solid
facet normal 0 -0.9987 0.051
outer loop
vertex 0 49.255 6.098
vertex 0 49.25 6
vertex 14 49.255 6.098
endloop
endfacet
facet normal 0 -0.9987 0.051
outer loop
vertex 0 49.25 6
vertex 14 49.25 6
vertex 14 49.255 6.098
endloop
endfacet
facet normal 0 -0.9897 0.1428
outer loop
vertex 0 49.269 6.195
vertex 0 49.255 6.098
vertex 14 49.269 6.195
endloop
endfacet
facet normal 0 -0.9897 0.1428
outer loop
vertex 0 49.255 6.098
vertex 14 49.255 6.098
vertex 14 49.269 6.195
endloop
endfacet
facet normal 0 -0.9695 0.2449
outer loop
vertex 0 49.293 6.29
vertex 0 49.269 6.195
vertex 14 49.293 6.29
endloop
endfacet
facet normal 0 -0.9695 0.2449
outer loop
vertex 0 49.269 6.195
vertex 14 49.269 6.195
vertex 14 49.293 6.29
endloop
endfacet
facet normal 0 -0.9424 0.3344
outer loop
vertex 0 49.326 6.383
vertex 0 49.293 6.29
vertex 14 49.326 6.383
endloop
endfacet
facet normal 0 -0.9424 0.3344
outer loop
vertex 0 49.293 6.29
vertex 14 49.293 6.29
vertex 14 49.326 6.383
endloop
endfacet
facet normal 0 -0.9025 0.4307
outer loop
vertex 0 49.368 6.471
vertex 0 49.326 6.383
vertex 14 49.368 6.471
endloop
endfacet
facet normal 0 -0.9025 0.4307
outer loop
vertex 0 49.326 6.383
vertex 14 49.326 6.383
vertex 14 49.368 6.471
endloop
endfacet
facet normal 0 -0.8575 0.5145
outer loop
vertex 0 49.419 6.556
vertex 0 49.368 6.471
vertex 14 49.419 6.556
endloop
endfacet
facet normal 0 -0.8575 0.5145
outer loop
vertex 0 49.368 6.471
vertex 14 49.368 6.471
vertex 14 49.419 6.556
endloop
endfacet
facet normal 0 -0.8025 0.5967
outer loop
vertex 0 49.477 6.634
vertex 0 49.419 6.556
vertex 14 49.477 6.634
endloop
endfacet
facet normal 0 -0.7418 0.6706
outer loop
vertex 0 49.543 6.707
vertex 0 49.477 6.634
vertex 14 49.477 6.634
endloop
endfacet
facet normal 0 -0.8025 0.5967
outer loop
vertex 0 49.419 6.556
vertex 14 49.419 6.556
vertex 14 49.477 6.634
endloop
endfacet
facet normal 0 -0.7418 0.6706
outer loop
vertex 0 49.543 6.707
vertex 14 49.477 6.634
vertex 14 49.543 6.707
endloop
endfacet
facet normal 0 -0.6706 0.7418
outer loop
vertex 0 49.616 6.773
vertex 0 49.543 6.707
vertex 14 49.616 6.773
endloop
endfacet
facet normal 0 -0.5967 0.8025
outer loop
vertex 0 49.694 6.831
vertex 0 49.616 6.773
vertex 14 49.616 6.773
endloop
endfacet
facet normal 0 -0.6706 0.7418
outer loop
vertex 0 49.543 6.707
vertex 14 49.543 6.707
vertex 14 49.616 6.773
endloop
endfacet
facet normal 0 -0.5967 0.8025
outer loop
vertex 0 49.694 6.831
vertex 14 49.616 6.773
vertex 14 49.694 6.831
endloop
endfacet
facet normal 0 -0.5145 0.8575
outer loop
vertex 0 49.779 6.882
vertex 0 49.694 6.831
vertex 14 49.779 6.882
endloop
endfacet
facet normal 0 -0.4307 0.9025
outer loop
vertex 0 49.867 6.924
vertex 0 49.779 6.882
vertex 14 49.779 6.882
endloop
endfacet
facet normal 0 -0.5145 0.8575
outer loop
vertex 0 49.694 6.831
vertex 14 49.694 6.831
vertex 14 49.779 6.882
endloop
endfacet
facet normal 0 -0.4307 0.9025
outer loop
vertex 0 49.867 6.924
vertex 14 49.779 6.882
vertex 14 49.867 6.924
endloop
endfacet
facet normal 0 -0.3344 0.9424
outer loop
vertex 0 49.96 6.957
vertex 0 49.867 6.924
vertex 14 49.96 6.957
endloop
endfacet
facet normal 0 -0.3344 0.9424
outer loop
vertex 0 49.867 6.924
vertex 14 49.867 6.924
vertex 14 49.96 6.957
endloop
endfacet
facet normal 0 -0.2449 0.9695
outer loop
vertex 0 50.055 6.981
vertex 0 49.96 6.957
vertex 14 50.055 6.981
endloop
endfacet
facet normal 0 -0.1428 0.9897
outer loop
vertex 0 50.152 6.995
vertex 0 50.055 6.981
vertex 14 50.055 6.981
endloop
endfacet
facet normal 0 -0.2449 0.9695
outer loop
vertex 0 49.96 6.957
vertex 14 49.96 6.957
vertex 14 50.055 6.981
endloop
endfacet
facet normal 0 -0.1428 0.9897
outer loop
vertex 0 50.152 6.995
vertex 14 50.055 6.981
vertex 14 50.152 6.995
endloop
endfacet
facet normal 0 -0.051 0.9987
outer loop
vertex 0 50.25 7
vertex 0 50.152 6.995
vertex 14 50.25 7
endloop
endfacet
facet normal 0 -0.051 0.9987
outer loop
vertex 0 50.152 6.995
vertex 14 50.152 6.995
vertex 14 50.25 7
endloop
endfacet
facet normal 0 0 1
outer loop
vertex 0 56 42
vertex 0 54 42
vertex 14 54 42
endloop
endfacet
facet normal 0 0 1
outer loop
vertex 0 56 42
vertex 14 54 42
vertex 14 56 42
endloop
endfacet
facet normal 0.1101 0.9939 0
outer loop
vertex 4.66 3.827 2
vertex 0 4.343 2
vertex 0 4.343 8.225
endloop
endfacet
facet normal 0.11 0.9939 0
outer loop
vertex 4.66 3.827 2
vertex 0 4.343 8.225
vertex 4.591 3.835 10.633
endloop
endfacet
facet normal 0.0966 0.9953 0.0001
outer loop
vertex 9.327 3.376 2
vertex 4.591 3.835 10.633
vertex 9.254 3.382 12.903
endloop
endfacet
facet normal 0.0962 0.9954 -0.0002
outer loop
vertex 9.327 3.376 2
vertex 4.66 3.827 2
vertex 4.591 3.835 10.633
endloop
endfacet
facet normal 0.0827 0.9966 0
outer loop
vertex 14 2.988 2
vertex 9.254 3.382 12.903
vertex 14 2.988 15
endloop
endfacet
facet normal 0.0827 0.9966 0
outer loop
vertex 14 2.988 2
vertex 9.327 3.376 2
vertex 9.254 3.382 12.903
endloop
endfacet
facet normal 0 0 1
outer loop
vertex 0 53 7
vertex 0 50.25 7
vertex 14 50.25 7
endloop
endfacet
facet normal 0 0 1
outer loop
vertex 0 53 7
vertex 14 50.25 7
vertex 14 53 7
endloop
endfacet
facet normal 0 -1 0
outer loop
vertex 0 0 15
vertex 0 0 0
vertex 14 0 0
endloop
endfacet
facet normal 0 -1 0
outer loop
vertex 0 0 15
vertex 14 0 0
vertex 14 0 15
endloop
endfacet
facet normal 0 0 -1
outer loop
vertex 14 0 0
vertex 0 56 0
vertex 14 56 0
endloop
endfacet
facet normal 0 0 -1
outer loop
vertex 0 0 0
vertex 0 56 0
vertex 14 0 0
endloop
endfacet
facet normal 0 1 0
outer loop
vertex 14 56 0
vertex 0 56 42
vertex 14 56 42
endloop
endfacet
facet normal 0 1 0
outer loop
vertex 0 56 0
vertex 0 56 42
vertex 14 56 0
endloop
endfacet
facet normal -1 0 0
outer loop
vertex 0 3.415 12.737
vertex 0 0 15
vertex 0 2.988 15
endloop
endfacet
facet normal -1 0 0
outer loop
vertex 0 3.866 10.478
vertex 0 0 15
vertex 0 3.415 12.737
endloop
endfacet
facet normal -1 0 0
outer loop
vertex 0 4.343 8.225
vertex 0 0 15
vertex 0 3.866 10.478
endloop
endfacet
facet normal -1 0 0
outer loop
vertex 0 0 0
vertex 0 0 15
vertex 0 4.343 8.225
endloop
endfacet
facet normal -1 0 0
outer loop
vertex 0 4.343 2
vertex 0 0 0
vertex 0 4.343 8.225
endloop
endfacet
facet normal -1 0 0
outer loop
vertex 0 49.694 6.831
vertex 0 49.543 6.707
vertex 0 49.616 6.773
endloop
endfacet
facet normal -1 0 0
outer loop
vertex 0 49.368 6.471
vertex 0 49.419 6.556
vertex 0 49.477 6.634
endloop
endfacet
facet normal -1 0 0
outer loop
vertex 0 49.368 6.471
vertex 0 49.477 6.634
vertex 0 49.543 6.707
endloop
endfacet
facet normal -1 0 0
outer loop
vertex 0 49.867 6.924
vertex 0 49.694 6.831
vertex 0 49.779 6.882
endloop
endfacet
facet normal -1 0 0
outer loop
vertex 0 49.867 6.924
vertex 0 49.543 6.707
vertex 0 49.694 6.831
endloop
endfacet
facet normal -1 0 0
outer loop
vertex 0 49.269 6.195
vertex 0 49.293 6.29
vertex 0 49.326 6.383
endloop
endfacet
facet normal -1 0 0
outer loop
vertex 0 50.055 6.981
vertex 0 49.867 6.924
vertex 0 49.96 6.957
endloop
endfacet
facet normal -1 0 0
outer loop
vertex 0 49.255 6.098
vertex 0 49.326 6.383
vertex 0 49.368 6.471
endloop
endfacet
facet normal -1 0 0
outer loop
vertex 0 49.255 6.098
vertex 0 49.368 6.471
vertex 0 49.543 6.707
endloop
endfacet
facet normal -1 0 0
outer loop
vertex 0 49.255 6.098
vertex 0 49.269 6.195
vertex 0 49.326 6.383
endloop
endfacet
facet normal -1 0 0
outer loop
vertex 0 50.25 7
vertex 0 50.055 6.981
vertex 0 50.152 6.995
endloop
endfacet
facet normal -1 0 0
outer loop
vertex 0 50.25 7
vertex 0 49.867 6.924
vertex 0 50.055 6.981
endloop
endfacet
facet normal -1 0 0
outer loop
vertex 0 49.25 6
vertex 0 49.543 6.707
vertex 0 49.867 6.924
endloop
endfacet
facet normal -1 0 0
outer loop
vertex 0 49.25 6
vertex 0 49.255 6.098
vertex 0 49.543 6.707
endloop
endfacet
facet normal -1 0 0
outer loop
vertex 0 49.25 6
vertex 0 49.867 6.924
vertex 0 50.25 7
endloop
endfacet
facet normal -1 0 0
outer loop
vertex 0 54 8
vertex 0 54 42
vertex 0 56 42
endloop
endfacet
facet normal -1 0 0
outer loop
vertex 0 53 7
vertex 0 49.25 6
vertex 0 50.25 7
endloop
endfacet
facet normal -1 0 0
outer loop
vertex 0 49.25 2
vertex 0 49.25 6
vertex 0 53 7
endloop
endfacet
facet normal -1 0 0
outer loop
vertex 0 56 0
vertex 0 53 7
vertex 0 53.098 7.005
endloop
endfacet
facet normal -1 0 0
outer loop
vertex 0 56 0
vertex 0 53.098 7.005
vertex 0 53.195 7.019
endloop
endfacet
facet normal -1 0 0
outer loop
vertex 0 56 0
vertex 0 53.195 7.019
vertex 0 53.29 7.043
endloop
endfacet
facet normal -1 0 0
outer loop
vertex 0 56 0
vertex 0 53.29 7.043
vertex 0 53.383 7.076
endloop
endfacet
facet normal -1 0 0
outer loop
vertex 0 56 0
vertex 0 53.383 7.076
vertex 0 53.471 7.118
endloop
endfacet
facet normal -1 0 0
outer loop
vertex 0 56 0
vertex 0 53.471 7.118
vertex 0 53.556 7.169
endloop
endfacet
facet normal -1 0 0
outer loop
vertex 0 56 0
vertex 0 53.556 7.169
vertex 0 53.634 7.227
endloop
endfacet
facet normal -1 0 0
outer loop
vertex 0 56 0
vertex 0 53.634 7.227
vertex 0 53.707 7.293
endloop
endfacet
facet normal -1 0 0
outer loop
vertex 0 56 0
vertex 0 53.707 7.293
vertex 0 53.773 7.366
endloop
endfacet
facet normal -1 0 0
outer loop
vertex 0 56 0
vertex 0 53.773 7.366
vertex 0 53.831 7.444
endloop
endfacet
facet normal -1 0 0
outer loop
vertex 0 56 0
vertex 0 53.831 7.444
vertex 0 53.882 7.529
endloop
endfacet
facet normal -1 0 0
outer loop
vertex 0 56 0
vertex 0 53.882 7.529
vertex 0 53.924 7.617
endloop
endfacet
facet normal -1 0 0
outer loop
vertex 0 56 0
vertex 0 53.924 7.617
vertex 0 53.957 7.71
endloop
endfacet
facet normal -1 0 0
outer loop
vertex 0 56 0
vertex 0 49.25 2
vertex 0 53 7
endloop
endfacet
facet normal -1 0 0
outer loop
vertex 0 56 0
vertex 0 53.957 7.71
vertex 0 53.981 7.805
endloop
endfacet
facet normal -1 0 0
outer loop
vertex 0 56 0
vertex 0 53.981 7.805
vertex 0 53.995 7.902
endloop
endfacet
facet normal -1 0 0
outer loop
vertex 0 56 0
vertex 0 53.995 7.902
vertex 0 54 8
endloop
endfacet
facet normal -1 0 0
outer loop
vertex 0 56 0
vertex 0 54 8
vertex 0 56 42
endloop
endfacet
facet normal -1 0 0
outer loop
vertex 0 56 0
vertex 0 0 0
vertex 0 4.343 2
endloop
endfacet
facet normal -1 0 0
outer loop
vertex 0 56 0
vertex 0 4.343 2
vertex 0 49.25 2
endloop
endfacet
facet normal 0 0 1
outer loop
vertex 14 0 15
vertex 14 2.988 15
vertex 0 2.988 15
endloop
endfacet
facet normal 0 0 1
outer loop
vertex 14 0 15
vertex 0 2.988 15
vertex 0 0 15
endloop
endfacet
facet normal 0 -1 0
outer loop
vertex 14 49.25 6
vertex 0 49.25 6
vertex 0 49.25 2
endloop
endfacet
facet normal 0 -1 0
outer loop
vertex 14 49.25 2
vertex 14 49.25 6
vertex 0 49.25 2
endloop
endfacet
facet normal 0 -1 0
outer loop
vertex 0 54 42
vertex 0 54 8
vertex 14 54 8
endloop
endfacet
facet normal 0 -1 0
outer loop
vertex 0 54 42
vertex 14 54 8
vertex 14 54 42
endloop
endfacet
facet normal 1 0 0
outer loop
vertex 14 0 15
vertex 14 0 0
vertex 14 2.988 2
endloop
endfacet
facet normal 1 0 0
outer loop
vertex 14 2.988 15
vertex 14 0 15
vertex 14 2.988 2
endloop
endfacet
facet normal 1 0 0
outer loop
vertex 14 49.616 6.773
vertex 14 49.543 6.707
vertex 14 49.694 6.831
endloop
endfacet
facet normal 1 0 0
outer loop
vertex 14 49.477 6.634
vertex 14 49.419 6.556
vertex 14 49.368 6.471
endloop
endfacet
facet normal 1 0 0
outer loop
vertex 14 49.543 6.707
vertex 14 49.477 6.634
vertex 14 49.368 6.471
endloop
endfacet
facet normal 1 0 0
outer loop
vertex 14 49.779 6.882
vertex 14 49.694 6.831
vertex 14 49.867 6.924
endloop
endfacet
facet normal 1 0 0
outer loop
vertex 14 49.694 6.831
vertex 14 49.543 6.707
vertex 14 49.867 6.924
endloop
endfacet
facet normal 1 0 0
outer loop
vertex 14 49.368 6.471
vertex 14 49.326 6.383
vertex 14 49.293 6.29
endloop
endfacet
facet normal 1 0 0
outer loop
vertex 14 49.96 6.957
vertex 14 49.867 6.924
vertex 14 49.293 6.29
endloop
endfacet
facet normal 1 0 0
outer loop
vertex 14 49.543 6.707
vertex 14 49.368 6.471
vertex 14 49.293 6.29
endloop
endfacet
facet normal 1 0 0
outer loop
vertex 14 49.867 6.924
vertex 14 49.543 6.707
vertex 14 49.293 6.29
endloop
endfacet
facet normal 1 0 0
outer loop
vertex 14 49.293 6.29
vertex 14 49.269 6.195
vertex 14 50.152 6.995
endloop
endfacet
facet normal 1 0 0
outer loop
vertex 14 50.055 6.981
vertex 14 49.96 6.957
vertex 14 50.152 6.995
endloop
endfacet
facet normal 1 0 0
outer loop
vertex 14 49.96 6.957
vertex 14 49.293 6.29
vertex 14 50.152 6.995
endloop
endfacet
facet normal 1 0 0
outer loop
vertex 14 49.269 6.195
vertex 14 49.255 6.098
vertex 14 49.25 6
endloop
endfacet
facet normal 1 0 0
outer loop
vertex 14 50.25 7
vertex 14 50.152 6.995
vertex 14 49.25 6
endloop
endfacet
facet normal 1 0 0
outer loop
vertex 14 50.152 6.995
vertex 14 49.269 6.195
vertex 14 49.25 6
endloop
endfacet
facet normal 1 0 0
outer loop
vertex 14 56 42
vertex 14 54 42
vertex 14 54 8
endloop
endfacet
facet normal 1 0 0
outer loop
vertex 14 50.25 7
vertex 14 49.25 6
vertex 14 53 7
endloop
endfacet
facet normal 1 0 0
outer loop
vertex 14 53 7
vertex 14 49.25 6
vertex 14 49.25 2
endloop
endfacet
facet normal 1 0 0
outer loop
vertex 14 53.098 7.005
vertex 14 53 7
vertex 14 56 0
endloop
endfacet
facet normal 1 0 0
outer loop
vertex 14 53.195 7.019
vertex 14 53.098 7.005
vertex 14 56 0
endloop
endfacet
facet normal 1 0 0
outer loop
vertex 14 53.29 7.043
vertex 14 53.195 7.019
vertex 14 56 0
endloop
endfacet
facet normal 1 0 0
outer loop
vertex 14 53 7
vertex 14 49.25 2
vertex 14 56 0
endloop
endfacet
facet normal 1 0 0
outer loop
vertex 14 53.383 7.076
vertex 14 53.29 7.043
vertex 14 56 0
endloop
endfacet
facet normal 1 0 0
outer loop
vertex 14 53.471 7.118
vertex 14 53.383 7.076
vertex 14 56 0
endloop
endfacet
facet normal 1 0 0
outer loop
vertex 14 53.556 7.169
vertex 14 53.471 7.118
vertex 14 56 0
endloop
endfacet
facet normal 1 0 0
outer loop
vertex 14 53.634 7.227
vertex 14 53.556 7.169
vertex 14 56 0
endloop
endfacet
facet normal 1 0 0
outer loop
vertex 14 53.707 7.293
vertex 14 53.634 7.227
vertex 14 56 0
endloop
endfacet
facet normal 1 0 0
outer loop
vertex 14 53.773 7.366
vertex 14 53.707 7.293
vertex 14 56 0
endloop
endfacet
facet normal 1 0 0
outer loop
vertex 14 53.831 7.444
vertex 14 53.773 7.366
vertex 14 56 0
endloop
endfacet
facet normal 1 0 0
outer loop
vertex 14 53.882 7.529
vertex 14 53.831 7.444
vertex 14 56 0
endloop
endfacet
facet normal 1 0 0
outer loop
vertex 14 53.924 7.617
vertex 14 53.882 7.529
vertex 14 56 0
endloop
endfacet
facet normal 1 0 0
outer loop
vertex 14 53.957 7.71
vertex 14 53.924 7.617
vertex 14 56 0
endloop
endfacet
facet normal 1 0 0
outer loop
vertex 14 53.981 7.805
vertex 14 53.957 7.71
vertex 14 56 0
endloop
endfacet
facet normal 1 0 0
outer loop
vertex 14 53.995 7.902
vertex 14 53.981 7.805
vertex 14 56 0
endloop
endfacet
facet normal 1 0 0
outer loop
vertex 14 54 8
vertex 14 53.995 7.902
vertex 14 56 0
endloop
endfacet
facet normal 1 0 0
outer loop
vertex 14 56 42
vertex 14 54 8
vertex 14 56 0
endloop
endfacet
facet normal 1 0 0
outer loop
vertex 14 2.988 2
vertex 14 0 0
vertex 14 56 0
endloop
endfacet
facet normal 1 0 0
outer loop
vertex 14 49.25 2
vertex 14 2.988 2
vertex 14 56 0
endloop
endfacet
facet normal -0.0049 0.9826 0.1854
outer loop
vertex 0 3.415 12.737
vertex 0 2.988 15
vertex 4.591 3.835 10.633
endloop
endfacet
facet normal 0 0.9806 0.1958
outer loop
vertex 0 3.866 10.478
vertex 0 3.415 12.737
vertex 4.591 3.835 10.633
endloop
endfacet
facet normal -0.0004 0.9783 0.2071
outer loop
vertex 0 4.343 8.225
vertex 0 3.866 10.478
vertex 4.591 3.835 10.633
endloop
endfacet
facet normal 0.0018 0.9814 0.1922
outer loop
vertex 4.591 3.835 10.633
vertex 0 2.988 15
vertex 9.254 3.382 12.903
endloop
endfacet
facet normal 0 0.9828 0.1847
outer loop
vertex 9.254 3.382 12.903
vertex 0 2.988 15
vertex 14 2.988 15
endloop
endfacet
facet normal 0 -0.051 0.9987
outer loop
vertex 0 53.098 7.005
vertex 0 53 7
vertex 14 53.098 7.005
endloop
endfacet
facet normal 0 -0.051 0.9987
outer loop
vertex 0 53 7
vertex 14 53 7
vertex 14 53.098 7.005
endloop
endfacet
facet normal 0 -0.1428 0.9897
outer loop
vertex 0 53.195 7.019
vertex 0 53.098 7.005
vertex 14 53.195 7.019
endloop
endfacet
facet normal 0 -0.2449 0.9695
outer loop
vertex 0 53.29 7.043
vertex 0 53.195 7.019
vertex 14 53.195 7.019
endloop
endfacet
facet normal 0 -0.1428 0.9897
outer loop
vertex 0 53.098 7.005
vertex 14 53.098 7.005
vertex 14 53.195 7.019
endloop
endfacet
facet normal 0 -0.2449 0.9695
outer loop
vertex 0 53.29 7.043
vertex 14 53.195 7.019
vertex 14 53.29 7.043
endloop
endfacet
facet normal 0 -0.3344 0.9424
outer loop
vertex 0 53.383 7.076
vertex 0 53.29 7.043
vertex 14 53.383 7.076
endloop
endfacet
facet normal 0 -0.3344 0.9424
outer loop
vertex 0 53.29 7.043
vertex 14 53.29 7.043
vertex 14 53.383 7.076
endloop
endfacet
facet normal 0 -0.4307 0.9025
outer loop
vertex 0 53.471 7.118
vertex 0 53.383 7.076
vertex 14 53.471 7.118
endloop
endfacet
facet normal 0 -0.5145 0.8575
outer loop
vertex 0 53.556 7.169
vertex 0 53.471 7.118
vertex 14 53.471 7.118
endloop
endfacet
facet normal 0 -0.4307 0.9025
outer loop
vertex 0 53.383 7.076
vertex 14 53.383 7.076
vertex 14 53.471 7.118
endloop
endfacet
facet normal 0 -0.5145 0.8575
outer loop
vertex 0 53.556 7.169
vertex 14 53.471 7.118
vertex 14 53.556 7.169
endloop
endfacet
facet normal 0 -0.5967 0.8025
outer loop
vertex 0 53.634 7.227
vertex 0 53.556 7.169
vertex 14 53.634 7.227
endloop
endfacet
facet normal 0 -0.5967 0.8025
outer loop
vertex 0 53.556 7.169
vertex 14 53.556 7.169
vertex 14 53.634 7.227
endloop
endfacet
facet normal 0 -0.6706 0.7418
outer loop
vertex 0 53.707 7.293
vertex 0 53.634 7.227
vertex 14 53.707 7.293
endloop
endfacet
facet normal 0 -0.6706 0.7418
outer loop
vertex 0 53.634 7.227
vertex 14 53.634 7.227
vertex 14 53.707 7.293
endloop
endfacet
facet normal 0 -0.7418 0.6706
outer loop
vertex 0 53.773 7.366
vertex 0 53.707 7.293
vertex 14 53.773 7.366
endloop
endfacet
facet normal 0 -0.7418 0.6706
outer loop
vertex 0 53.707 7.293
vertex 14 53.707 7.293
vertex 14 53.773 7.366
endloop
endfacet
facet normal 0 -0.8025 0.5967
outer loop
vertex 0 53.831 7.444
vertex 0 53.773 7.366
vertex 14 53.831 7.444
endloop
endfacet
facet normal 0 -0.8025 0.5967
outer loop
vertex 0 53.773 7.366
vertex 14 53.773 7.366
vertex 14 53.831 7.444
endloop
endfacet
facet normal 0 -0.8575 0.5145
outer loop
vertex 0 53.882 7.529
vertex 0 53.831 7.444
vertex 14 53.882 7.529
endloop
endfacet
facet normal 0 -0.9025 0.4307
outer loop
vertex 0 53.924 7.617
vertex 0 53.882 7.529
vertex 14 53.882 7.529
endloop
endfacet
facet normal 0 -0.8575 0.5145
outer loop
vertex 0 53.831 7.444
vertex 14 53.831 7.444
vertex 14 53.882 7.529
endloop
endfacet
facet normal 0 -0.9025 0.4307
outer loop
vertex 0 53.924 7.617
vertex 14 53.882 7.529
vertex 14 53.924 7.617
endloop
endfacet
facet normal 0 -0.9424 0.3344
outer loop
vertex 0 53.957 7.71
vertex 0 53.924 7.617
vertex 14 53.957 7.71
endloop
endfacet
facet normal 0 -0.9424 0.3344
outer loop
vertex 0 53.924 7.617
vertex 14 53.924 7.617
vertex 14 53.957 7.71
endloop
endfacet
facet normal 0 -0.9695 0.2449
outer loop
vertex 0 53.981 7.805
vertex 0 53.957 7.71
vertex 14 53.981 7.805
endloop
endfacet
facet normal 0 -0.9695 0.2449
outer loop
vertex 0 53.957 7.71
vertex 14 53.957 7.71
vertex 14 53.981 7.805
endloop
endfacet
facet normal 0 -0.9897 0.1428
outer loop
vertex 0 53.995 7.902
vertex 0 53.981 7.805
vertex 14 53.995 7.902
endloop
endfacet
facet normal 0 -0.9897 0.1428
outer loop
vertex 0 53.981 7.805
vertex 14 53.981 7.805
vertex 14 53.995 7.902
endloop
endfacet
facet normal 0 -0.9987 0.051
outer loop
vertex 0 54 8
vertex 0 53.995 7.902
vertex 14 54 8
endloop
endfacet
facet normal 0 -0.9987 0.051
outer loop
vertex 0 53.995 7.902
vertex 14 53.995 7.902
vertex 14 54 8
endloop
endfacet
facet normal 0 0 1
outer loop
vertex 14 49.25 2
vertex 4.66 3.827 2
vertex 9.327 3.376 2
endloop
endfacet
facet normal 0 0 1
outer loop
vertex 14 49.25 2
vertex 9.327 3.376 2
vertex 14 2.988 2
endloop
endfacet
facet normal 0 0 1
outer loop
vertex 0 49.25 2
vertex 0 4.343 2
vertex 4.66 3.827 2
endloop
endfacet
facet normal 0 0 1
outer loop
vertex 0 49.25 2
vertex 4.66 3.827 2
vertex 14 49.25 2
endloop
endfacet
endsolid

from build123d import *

# Parameters (mm, degrees)
PAD_DEPTH    = 14
PAD001_DEPTH = 13
POCKET_DEPTH = 100
SKETCH003_W  = 4.75
SKETCH003_H  = 5
PAD002_DEPTH = 14
FILLET_R     = 1
FILLET001_R  = 1


with BuildPart() as part:
    # Sketch → Pad (new body)
    with BuildSketch(Plane.YZ):
        Polygon((0, 0), (0, 15), (2, 15), (2, 2), (54, 2), (54, 42), (56, 42), (56, 0), align=None)
    extrude(amount=PAD_DEPTH)

    # Sketch001 (on Face4 of Pad) → Pad001 (join)
    with BuildSketch(Plane(origin=(0, 0, 2), x_dir=(0, -1, 0), z_dir=(0, 0, 1))):
        with BuildLine():
            Line((-2, 14), (-2.987861, 14))
            ThreePointArc((-4.342771, 0), (-3.593472, 6.993047), (-2.987861, 14))
            Line((-2, 0), (-4.342771, 0))
            Line((-2, 0), (-2, 14))
        make_face()
    extrude(amount=PAD001_DEPTH)

    # Sketch002 (on Face10 of Pad001) → Pocket (cut)
    with BuildSketch(Plane.YZ.offset(14)):
        with BuildLine():
            ThreePointArc((2.987861, 15), (4.153127, 9.106971), (5.487861, 3.25))
            Line((5.487861, 15), (5.487861, 3.25))
            Line((2.987861, 15), (5.487861, 15))
        make_face()
    extrude(amount=-POCKET_DEPTH, mode=Mode.SUBTRACT)

    # Sketch003 (on Face2 of Pocket) → Pad002 (join)
    with BuildSketch(Plane(origin=(0, 0, 0), x_dir=(0, 1, 0), z_dir=(-1, 0, 0))):
        with Locations((51.625, -4.5)):
            Rectangle(SKETCH003_W, SKETCH003_H)
    extrude(amount=-PAD002_DEPTH)

    # Fillet
    fillet_edges = [part.edges().sort_by_distance(p)[0] for p in [
        (7, 49.25, 7),
    ]]
    fillet(fillet_edges, radius=FILLET_R)

    # Fillet001
    fillet001_edges = [part.edges().sort_by_distance(p)[0] for p in [
        (7, 54, 7),
    ]]
    fillet(fillet001_edges, radius=FILLET001_R)


solid = part.part
